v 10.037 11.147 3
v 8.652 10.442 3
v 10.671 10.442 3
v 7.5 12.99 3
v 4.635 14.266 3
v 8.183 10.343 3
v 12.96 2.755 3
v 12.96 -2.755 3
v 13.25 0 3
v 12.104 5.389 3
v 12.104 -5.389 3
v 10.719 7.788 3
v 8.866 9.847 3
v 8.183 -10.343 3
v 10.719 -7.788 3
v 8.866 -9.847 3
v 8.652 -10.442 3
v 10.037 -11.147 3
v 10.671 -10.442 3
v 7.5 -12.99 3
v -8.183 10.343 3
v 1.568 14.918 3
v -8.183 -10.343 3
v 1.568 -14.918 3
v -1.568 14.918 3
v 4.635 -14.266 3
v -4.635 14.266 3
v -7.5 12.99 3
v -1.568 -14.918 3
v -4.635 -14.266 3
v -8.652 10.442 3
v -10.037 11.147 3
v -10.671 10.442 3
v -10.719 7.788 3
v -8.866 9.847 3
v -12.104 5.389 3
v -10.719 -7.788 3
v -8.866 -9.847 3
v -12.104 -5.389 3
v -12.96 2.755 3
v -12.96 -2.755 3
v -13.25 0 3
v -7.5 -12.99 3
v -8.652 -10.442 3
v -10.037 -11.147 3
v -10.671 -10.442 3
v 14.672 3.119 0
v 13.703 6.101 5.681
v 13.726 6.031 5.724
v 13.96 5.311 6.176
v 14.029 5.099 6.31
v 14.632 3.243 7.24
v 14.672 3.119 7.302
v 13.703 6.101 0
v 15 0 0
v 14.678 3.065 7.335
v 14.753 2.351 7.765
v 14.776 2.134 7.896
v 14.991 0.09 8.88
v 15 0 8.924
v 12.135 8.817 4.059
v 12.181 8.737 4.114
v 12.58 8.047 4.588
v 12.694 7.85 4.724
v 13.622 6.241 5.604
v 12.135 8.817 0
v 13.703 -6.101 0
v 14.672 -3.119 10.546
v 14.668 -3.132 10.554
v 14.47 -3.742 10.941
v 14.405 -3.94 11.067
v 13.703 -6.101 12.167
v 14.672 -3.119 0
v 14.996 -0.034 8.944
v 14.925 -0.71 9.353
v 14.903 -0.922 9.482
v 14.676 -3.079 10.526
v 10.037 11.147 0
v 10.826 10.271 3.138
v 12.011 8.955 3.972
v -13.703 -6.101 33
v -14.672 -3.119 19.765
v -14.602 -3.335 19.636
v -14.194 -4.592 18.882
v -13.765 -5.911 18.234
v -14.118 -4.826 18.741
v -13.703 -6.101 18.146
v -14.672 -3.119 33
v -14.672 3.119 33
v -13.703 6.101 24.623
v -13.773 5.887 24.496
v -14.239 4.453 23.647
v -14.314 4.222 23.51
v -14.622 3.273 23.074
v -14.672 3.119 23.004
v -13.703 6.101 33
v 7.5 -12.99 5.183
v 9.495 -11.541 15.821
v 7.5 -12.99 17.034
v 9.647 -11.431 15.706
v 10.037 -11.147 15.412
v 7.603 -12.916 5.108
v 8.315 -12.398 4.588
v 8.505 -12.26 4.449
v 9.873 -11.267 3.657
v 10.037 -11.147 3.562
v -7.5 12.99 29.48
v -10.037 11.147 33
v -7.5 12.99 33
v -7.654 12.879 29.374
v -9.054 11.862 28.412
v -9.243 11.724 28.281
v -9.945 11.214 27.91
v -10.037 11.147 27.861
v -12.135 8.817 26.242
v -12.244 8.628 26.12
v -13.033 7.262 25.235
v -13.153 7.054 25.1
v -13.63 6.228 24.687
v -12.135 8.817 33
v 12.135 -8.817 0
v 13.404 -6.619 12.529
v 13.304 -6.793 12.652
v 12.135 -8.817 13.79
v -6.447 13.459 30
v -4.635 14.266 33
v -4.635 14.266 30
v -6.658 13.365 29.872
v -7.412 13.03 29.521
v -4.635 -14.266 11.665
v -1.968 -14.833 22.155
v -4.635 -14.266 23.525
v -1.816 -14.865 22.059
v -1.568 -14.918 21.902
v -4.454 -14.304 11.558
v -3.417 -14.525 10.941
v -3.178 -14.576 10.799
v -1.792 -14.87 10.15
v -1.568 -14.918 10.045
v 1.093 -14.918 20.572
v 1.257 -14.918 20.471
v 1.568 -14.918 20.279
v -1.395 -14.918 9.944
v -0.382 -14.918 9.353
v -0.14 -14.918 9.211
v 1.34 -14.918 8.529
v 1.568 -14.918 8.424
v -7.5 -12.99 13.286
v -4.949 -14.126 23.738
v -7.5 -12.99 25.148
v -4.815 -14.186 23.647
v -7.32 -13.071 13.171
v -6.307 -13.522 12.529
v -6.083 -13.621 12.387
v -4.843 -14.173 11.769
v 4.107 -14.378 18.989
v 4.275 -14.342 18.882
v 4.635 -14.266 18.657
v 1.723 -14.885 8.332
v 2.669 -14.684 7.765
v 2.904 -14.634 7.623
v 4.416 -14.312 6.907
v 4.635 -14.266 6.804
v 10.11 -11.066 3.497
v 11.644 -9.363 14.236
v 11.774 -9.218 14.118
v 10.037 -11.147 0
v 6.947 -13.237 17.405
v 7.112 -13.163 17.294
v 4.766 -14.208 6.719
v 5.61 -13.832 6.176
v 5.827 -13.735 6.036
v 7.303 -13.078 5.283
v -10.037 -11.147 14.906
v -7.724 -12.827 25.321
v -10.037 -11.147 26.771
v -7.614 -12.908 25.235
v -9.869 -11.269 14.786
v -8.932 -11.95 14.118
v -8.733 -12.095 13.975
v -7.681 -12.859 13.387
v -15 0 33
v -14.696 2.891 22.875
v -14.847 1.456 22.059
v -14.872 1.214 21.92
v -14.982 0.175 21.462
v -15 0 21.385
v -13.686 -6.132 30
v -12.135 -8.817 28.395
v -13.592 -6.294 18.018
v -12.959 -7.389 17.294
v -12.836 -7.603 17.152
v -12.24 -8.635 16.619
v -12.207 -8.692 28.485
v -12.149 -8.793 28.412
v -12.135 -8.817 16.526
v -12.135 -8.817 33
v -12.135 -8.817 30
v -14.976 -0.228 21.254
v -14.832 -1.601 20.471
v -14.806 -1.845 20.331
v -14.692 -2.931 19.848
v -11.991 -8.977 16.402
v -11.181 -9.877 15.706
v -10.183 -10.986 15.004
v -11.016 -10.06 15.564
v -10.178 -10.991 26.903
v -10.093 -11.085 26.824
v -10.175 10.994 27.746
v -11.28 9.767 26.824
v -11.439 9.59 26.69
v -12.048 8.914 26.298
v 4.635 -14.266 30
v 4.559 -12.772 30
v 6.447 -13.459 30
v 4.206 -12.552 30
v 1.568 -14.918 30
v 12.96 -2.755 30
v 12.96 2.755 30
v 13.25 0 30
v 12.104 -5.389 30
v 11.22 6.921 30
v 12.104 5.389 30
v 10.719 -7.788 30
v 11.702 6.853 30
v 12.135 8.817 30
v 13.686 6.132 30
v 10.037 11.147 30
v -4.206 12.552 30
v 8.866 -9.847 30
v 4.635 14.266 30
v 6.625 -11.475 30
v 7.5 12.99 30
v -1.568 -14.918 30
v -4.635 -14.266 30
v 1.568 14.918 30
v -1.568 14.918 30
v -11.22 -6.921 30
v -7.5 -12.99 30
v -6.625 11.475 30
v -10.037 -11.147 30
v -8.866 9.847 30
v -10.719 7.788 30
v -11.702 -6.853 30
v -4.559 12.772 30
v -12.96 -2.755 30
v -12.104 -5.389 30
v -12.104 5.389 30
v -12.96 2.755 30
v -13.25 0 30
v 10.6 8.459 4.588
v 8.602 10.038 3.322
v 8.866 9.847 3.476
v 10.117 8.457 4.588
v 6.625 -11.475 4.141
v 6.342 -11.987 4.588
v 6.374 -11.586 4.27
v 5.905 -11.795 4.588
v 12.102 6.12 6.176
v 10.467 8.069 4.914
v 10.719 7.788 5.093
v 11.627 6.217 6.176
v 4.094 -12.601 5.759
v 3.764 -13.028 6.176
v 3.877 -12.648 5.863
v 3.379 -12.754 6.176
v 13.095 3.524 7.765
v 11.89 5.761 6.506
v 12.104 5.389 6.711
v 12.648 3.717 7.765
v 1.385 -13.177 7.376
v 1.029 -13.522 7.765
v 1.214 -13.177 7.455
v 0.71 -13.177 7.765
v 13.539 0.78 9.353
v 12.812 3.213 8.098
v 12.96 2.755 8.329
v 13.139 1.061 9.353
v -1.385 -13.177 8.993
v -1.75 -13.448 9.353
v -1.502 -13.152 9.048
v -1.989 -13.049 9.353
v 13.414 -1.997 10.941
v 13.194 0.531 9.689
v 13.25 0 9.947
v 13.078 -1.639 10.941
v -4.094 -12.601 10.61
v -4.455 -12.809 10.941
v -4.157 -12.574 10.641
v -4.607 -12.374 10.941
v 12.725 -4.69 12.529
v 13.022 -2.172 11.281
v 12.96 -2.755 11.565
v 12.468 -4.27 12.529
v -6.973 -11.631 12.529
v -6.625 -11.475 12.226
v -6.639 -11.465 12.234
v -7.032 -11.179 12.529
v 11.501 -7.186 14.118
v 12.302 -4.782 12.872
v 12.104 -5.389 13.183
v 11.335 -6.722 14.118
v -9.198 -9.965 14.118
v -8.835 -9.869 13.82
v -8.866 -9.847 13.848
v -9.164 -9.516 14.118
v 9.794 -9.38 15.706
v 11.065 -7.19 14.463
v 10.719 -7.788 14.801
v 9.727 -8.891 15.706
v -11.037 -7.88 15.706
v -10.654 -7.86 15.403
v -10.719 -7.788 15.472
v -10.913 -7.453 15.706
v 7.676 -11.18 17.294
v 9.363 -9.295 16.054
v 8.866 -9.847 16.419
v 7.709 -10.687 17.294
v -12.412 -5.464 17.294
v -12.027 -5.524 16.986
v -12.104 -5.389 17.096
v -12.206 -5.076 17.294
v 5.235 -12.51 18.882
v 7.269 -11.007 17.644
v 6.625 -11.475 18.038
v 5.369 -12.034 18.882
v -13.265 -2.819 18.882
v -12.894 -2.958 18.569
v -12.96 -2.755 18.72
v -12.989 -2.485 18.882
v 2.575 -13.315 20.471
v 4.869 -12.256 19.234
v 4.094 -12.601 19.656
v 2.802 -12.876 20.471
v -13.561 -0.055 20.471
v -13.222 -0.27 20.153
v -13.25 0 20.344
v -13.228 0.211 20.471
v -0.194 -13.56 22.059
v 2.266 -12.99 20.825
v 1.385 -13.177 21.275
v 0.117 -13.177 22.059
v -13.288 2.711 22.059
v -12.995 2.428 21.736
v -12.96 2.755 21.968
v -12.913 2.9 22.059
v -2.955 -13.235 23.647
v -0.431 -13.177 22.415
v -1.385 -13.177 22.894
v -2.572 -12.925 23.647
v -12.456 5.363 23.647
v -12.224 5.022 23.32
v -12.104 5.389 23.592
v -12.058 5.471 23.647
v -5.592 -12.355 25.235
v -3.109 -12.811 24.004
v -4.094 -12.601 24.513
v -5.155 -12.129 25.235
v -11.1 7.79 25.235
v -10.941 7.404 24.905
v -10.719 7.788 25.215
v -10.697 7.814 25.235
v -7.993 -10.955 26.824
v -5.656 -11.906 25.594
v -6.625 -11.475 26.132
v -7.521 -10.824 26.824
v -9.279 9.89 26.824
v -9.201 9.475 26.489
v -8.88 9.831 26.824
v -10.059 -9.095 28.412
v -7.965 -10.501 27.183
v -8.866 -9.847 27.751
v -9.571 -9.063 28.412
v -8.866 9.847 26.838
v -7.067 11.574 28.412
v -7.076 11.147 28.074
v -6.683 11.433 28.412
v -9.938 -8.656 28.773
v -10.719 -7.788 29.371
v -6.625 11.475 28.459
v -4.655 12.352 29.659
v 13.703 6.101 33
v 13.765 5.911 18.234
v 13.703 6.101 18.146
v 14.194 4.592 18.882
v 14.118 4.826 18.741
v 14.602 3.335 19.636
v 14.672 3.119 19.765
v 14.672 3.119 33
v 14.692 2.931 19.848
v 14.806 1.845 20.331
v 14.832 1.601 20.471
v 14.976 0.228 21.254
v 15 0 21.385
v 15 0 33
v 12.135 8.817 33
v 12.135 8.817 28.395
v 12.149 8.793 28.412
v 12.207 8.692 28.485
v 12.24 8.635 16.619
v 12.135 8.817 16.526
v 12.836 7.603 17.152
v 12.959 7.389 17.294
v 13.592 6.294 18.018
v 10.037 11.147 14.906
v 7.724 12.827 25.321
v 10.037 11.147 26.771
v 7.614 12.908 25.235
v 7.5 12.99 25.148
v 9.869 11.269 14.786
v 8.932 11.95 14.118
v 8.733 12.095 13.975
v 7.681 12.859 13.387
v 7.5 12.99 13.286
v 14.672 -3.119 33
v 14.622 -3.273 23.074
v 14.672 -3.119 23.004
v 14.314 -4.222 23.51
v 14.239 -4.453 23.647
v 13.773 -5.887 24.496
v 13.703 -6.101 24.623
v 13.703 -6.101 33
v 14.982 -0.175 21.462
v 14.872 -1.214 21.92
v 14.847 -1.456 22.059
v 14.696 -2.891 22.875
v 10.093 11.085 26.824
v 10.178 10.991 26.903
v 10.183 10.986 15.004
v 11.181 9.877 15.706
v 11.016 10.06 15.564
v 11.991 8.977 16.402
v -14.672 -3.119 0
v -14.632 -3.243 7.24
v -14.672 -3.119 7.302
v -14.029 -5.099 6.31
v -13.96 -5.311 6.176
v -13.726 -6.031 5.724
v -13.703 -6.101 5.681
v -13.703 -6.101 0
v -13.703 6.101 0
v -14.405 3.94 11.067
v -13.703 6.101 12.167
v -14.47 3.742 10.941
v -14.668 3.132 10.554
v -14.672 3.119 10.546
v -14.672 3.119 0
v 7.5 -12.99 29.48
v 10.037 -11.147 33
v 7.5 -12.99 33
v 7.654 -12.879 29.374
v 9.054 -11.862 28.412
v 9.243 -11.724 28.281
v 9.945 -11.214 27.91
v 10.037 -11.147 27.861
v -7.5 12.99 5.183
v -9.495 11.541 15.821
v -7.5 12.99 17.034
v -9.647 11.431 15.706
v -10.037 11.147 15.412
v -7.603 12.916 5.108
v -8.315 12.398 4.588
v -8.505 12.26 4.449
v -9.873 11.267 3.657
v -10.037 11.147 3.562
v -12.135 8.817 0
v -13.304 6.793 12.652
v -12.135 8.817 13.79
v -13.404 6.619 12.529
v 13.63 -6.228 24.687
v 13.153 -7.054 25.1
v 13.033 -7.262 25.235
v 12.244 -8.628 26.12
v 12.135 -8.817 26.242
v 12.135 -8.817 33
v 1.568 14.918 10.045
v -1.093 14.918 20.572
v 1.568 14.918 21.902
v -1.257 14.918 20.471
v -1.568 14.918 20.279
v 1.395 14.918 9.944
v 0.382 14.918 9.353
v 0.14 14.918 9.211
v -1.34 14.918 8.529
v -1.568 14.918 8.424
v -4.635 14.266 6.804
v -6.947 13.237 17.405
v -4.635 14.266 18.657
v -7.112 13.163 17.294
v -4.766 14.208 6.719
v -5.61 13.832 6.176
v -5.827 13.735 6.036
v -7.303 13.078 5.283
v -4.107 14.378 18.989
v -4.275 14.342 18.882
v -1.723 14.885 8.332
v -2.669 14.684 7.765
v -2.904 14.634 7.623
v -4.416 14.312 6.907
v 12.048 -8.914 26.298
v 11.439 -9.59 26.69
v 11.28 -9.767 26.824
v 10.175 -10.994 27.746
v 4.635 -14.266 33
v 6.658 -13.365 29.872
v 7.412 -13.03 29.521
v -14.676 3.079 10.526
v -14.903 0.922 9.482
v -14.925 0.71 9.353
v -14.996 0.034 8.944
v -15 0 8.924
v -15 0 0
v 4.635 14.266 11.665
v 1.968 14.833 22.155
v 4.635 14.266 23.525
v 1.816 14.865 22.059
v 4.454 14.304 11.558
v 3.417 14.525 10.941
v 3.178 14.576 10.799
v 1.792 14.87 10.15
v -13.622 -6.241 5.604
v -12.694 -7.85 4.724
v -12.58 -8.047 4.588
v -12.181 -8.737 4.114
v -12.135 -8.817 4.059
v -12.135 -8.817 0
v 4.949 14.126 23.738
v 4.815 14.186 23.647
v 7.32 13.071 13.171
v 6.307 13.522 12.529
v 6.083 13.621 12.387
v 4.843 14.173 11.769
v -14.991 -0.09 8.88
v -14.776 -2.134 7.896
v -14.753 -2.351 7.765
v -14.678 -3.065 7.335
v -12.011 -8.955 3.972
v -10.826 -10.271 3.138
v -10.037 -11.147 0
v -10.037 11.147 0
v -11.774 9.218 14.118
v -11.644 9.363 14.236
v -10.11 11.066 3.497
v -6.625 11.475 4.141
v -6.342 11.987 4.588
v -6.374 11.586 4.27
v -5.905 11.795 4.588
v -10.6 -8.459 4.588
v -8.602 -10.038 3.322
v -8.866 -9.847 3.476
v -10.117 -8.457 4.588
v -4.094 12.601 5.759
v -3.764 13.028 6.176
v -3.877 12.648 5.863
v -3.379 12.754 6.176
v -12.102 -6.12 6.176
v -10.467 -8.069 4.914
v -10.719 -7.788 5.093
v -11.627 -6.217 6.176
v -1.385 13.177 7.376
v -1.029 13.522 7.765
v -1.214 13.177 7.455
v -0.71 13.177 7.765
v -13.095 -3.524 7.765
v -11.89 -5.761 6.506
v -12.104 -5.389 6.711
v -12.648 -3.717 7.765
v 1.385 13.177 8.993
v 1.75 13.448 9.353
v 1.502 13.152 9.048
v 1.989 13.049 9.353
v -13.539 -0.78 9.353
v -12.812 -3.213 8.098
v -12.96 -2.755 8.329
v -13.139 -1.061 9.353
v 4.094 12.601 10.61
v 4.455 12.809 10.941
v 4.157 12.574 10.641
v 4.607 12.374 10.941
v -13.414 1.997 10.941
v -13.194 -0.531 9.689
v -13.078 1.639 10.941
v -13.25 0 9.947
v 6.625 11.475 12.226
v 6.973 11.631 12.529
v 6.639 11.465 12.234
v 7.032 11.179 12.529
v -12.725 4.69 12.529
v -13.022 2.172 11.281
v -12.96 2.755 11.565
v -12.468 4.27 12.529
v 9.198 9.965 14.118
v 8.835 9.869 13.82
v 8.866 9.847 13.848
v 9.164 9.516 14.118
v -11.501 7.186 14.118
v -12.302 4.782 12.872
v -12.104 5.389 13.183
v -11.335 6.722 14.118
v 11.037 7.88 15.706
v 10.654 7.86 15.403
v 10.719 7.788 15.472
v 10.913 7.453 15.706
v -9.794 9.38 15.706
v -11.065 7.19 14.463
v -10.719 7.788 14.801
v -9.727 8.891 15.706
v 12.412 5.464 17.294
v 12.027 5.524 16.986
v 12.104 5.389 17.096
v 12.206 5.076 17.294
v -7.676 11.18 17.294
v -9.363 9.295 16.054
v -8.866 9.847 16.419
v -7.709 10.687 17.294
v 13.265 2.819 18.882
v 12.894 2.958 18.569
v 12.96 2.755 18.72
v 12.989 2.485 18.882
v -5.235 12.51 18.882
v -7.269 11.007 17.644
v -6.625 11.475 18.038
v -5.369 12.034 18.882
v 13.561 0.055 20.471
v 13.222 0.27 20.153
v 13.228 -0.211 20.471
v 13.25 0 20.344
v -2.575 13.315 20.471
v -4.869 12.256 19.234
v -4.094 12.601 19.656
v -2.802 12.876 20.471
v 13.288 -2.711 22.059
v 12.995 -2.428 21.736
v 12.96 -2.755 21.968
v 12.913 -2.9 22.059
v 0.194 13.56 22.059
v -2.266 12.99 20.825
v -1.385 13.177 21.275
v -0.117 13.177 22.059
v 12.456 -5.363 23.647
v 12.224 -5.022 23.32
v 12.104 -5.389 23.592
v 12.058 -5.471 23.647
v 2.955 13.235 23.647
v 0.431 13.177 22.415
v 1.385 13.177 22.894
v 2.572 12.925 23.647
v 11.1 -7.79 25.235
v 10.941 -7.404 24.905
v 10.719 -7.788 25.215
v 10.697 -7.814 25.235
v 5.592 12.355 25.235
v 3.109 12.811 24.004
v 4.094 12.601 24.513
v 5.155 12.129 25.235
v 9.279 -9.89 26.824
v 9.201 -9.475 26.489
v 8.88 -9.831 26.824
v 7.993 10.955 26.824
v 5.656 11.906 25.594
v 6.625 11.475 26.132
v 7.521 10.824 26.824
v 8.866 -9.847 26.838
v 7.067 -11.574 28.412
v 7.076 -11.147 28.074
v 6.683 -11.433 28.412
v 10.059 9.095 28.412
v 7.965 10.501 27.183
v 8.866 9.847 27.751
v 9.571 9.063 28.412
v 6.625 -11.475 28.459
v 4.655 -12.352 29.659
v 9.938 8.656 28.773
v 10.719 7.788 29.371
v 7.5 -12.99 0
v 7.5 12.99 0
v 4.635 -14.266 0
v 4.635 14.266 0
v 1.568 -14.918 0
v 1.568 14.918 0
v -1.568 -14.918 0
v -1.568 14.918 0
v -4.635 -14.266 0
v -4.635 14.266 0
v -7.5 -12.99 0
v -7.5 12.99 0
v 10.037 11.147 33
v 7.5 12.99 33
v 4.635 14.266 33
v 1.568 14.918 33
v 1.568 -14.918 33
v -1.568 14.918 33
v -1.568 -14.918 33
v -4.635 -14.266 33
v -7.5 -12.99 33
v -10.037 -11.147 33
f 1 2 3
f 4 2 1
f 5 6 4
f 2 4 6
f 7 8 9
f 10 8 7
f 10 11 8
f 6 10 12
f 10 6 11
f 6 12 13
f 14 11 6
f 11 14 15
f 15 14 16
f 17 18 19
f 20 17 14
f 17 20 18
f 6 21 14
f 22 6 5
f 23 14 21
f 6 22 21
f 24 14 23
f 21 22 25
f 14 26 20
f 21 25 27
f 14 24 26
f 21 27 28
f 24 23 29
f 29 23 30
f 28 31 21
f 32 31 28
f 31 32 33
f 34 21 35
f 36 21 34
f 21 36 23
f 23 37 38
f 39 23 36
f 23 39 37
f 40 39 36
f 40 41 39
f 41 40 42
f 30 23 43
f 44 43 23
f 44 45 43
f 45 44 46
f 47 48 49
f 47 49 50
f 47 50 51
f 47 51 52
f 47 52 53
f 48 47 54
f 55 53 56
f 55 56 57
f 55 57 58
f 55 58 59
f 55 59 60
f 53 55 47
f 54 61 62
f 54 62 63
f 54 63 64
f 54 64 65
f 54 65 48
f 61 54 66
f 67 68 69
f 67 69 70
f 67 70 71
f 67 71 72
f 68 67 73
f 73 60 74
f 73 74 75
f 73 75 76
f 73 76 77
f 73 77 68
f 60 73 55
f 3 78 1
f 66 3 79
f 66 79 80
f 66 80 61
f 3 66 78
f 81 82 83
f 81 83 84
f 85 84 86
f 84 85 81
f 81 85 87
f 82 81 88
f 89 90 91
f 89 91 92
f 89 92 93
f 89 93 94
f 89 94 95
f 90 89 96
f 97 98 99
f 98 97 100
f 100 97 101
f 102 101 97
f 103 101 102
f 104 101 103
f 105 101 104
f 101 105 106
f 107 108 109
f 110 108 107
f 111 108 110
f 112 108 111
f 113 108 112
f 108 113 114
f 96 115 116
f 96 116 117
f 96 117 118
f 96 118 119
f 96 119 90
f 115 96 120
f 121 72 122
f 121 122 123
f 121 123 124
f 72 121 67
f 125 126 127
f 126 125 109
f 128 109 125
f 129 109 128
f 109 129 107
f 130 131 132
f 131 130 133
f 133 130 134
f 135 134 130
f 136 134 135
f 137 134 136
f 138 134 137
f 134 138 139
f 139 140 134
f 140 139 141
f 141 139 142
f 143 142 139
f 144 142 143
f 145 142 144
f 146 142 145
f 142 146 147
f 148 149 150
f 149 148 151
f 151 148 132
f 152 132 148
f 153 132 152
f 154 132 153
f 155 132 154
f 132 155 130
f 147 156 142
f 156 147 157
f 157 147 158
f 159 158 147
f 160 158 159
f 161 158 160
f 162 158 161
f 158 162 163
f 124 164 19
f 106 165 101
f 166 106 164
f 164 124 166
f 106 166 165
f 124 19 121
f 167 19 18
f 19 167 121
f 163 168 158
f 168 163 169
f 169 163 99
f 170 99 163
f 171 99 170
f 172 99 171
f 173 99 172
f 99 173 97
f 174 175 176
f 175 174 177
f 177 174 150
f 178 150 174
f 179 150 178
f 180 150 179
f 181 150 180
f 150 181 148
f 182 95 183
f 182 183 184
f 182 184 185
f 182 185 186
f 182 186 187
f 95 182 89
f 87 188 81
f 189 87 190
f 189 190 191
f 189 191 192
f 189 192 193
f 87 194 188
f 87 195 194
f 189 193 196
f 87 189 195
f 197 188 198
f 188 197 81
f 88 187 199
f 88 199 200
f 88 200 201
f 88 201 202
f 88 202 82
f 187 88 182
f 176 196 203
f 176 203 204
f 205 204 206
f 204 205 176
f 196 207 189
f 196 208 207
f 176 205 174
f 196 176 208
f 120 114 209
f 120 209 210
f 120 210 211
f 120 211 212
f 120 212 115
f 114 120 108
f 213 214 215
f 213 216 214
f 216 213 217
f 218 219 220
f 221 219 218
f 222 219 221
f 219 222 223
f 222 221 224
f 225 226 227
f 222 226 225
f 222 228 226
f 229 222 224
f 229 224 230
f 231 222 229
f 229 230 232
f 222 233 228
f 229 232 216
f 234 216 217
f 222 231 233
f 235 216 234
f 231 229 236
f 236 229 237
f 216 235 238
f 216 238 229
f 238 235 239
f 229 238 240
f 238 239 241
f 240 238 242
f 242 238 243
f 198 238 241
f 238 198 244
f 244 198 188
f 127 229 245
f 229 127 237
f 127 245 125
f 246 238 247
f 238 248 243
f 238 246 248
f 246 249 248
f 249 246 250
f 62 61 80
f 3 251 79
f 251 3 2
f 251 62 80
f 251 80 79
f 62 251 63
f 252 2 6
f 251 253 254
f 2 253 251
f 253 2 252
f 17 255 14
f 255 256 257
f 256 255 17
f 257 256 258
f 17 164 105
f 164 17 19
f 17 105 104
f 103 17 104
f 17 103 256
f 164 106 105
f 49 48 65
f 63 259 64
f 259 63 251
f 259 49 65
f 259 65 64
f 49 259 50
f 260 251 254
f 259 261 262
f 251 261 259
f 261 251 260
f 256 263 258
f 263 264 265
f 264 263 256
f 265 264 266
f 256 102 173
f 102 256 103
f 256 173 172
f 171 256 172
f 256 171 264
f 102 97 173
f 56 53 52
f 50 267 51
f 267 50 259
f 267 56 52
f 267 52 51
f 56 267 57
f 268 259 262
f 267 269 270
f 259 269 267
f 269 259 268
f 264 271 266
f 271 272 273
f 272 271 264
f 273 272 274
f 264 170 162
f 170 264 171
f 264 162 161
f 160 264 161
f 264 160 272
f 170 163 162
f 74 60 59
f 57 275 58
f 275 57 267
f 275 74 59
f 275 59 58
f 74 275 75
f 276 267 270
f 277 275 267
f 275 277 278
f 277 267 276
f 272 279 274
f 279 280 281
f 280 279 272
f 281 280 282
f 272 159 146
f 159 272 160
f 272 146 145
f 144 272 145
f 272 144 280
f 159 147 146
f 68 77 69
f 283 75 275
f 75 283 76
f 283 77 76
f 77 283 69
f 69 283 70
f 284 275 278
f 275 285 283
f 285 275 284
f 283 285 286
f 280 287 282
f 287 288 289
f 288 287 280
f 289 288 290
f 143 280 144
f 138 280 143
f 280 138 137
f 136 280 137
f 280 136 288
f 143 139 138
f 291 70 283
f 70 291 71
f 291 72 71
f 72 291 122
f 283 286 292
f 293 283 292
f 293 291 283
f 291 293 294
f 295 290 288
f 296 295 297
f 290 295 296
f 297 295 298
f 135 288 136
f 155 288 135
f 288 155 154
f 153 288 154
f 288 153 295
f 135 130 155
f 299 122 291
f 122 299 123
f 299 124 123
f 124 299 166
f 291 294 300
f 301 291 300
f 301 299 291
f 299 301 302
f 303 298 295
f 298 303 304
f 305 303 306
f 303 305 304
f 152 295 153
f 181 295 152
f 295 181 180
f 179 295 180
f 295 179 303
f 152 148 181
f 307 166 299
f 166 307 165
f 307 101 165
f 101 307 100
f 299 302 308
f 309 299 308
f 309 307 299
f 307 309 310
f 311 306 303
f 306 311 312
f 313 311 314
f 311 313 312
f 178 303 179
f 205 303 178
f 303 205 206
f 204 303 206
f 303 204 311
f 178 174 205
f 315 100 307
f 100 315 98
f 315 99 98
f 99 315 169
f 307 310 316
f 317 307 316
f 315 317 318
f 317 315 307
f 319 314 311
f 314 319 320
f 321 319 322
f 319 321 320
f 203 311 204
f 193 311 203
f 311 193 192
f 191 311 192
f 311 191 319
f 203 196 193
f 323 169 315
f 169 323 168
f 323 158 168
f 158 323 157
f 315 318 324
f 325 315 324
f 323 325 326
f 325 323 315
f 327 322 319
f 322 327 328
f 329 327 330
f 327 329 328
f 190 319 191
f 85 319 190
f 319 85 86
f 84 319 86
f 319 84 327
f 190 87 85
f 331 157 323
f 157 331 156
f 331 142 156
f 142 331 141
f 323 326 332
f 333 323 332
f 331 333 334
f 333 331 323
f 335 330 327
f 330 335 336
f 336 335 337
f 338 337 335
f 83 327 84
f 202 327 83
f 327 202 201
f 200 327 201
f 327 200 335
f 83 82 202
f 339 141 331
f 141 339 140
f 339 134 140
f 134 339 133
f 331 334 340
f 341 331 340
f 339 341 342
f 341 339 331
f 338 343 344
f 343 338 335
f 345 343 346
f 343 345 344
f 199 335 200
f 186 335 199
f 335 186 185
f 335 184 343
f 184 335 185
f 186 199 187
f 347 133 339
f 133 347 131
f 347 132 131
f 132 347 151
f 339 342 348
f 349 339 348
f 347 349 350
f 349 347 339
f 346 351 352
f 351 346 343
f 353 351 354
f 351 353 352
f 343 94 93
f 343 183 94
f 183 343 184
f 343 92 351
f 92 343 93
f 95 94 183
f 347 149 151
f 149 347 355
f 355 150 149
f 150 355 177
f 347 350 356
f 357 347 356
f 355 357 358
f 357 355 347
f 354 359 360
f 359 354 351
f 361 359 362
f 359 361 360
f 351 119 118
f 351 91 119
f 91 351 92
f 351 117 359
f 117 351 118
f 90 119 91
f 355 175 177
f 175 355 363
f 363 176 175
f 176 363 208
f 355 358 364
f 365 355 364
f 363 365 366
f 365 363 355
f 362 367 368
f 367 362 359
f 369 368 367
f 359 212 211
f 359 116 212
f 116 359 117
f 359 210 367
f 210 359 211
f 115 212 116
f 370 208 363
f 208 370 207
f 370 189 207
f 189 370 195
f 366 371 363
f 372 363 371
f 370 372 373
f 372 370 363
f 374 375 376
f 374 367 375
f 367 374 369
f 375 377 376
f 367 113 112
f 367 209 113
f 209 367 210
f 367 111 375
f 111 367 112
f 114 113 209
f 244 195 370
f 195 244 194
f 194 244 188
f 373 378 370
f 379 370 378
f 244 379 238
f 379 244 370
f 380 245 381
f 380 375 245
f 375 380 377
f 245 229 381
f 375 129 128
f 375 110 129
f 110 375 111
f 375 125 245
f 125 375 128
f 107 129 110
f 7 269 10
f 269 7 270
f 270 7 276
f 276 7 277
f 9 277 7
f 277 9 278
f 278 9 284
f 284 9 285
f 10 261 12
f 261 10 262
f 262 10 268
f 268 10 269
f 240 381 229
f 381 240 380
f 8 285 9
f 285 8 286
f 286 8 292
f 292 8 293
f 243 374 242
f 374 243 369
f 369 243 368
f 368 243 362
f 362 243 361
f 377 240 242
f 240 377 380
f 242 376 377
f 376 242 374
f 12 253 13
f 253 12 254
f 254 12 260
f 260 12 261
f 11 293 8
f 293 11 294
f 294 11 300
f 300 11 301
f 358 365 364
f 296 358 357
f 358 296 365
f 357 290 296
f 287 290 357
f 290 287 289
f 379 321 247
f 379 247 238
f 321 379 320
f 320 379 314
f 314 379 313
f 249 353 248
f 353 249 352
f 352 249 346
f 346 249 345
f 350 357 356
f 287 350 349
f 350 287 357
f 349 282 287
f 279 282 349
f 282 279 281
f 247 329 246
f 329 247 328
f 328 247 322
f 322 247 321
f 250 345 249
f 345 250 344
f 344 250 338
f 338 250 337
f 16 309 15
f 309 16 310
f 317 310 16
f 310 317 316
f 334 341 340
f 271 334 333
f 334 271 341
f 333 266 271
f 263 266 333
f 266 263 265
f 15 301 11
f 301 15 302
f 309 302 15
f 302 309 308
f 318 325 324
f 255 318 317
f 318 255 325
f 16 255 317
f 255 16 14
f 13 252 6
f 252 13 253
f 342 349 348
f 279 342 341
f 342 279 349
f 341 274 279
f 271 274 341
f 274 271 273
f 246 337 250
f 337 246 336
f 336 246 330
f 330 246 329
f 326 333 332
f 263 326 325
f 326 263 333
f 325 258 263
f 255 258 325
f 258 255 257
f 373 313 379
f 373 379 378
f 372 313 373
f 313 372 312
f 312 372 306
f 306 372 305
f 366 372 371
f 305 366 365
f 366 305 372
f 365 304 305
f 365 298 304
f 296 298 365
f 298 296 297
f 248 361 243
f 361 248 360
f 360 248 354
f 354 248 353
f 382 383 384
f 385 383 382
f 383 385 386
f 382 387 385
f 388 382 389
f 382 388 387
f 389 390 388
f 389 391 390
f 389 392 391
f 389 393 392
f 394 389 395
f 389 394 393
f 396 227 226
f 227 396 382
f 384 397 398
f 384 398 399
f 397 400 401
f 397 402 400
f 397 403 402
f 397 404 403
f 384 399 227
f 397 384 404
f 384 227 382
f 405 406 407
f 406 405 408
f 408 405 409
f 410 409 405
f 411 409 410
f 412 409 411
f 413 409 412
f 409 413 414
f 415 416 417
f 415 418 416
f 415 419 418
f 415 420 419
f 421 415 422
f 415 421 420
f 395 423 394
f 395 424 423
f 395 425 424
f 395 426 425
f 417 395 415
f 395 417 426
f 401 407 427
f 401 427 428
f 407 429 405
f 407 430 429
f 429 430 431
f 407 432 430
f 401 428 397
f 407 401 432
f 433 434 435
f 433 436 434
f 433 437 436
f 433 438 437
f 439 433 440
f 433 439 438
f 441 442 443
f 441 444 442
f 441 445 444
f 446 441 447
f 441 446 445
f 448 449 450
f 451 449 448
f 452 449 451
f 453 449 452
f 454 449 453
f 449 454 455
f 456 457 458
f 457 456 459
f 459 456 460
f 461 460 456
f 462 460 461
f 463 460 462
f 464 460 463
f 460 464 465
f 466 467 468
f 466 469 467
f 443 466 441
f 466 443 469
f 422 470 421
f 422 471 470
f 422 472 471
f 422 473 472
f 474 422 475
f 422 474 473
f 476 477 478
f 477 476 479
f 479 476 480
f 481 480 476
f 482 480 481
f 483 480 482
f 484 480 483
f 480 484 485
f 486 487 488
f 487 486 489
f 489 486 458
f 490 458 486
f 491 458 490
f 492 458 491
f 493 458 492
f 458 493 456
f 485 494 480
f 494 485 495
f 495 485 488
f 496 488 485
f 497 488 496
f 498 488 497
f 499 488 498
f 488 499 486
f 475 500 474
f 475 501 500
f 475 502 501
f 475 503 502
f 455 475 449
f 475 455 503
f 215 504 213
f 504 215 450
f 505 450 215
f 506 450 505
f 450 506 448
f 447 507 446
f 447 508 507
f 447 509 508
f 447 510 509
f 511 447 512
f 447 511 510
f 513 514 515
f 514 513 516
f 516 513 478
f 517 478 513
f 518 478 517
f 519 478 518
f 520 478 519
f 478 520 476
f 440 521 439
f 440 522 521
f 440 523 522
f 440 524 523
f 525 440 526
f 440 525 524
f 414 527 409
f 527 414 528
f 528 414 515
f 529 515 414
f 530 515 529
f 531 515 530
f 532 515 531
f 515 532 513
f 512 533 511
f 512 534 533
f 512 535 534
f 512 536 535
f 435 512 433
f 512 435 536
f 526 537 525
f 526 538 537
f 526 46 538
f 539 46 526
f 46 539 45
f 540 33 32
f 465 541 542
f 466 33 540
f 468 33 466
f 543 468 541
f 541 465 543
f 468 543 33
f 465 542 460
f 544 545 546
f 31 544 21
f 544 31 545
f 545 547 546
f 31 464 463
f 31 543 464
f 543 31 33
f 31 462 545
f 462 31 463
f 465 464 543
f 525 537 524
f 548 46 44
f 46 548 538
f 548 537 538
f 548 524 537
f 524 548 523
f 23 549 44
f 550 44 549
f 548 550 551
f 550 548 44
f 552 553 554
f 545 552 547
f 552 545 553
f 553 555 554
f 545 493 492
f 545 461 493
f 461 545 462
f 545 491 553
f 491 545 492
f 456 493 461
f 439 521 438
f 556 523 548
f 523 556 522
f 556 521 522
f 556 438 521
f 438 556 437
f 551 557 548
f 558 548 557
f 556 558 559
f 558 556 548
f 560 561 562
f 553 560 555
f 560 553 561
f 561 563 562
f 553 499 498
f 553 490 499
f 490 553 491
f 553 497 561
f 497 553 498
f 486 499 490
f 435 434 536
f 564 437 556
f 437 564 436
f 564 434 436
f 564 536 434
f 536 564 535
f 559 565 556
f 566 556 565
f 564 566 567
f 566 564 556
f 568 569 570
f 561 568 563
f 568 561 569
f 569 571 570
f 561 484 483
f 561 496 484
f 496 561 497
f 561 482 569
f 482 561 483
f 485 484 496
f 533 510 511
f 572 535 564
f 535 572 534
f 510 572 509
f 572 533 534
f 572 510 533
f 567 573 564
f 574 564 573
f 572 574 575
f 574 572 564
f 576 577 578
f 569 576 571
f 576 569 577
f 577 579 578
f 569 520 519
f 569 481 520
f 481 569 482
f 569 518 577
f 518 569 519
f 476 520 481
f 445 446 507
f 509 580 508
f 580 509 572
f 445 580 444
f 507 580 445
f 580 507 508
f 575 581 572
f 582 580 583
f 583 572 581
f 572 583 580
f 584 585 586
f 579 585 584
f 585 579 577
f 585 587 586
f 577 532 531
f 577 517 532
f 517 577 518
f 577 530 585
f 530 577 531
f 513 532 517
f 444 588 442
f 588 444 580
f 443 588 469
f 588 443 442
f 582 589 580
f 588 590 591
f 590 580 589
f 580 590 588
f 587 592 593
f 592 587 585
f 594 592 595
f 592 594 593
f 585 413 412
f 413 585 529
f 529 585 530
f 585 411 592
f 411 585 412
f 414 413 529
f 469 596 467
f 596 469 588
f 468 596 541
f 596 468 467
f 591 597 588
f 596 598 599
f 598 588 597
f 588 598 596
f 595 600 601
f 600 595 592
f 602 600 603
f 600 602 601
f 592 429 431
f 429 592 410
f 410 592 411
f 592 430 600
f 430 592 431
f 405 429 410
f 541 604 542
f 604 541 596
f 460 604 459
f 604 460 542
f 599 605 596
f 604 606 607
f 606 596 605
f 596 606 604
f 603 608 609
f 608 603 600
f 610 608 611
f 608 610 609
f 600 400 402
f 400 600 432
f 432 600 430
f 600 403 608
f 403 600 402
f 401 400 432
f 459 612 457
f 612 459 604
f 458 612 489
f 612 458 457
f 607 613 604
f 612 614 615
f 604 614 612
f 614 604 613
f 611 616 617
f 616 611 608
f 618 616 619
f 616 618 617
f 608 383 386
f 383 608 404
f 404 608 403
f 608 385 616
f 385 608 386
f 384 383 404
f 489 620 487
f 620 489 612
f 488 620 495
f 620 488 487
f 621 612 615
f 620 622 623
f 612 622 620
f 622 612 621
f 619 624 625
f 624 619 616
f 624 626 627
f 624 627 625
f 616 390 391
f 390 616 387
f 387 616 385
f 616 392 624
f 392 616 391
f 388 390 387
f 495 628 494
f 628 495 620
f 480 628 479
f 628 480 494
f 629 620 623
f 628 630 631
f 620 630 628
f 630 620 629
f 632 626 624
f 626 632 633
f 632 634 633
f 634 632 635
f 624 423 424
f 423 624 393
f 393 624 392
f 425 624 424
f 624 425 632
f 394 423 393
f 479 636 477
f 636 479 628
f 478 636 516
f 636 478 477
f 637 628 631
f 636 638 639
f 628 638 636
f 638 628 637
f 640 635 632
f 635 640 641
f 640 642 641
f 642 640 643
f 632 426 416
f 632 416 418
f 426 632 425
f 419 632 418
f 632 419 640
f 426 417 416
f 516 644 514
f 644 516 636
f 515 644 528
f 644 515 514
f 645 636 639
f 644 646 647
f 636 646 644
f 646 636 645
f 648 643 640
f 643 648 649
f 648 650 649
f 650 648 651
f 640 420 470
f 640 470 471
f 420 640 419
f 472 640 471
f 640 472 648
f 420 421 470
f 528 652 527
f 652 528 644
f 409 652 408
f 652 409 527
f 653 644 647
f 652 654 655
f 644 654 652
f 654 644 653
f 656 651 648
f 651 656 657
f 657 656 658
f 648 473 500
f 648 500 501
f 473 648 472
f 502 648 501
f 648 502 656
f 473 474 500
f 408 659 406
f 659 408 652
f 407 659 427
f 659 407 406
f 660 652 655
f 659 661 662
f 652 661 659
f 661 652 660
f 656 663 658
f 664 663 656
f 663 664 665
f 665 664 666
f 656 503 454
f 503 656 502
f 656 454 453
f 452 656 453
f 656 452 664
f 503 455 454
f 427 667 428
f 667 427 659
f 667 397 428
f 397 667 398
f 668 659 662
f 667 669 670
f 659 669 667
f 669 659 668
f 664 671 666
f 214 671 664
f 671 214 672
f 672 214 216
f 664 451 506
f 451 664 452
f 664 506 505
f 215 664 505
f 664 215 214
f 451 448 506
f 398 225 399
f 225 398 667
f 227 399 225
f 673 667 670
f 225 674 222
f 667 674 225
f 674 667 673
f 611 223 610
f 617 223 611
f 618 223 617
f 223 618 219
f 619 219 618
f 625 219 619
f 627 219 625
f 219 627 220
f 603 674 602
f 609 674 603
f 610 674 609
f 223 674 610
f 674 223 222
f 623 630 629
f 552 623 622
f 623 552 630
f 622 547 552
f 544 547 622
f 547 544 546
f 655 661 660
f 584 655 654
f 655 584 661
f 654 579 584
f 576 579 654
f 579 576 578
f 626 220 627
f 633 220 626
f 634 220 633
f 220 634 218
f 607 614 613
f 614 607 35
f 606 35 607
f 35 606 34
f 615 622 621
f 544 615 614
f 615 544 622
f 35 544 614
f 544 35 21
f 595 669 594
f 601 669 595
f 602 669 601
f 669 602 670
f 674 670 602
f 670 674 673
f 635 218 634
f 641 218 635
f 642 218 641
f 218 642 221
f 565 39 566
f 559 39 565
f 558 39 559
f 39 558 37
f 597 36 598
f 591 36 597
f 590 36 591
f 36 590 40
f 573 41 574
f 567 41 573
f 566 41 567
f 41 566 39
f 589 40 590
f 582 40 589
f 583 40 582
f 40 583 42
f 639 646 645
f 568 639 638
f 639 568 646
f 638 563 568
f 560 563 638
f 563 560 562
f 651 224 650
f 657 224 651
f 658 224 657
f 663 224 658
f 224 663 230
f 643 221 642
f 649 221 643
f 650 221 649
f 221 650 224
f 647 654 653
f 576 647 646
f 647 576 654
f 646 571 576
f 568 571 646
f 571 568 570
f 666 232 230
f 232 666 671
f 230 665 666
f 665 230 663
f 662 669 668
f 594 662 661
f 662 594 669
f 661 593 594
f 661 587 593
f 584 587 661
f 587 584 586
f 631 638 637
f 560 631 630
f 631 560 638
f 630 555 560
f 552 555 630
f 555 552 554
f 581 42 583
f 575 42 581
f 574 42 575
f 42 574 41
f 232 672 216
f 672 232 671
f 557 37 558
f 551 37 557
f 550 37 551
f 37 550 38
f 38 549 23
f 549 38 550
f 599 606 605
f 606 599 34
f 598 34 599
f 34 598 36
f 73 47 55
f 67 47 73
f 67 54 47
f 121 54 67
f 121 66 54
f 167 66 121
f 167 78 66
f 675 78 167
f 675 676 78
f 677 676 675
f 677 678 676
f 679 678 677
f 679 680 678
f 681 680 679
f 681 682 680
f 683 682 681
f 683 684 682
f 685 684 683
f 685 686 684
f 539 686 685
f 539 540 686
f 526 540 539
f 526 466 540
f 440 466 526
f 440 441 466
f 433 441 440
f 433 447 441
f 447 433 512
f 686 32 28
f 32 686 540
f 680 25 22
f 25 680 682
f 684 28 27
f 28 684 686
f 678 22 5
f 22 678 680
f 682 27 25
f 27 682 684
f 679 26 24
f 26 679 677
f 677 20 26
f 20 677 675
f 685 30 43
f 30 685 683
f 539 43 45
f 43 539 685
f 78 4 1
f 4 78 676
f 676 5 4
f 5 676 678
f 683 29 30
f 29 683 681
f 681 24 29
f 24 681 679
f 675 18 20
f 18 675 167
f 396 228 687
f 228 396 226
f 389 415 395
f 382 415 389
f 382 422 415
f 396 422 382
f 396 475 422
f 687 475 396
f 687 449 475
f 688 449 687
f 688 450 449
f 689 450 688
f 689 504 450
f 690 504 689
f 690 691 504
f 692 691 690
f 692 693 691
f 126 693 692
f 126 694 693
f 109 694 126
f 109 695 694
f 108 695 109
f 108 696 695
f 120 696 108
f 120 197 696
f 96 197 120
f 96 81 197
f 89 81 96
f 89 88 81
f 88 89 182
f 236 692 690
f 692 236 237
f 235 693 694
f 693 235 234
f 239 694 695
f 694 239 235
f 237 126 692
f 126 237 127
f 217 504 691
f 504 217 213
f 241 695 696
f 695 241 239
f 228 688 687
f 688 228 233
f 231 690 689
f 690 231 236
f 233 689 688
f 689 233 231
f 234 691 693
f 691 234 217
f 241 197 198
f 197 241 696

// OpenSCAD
//Pitch of the spiral
pitch = 2;

//Radius of the cylinder
radius = 15;

//Height of the cylinder
height = 30;

//Spiral Thickness
sp = 1.75;

thickness = radius*.7;

cylinder(h=height/10,r=radius,c=true);
translate([0,0,height]){
    cylinder(h=height/10,r=radius,c=true);
}

translate([0,0,height/10]){
    difference(){
        //Create The spiral
        linear_extrude(height*(9/10), center = false, convexity = 10, twist = pitch*100)
        translate([radius-thickness/2, 0, 0]){
        circle(r = thickness);}
        //Cut out the inside
        cylinder(h=height,r=radius-sp,c=false);
        //Cut out the outside
        difference(){
            cylinder(h=height,r=2*radius,c=false);
            cylinder(h=height,r=radius,c=false);
        }
    }
        
    
}

translate([0,0,height/10]){
    difference(){
        //Create The spiral
        linear_extrude(height*(9/10), center = false, convexity = 10, twist = pitch*100)
        translate([-(radius-thickness/2), 0, 0]){
        circle(r = thickness);}
        //Cut out the inside
        cylinder(h=height,r=radius-sp,c=false);
        //Cut out the outside
        difference(){
            cylinder(h=height,r=2*radius,c=false);
            cylinder(h=height,r=radius,c=false);
        }
    }
        
    
}
    
